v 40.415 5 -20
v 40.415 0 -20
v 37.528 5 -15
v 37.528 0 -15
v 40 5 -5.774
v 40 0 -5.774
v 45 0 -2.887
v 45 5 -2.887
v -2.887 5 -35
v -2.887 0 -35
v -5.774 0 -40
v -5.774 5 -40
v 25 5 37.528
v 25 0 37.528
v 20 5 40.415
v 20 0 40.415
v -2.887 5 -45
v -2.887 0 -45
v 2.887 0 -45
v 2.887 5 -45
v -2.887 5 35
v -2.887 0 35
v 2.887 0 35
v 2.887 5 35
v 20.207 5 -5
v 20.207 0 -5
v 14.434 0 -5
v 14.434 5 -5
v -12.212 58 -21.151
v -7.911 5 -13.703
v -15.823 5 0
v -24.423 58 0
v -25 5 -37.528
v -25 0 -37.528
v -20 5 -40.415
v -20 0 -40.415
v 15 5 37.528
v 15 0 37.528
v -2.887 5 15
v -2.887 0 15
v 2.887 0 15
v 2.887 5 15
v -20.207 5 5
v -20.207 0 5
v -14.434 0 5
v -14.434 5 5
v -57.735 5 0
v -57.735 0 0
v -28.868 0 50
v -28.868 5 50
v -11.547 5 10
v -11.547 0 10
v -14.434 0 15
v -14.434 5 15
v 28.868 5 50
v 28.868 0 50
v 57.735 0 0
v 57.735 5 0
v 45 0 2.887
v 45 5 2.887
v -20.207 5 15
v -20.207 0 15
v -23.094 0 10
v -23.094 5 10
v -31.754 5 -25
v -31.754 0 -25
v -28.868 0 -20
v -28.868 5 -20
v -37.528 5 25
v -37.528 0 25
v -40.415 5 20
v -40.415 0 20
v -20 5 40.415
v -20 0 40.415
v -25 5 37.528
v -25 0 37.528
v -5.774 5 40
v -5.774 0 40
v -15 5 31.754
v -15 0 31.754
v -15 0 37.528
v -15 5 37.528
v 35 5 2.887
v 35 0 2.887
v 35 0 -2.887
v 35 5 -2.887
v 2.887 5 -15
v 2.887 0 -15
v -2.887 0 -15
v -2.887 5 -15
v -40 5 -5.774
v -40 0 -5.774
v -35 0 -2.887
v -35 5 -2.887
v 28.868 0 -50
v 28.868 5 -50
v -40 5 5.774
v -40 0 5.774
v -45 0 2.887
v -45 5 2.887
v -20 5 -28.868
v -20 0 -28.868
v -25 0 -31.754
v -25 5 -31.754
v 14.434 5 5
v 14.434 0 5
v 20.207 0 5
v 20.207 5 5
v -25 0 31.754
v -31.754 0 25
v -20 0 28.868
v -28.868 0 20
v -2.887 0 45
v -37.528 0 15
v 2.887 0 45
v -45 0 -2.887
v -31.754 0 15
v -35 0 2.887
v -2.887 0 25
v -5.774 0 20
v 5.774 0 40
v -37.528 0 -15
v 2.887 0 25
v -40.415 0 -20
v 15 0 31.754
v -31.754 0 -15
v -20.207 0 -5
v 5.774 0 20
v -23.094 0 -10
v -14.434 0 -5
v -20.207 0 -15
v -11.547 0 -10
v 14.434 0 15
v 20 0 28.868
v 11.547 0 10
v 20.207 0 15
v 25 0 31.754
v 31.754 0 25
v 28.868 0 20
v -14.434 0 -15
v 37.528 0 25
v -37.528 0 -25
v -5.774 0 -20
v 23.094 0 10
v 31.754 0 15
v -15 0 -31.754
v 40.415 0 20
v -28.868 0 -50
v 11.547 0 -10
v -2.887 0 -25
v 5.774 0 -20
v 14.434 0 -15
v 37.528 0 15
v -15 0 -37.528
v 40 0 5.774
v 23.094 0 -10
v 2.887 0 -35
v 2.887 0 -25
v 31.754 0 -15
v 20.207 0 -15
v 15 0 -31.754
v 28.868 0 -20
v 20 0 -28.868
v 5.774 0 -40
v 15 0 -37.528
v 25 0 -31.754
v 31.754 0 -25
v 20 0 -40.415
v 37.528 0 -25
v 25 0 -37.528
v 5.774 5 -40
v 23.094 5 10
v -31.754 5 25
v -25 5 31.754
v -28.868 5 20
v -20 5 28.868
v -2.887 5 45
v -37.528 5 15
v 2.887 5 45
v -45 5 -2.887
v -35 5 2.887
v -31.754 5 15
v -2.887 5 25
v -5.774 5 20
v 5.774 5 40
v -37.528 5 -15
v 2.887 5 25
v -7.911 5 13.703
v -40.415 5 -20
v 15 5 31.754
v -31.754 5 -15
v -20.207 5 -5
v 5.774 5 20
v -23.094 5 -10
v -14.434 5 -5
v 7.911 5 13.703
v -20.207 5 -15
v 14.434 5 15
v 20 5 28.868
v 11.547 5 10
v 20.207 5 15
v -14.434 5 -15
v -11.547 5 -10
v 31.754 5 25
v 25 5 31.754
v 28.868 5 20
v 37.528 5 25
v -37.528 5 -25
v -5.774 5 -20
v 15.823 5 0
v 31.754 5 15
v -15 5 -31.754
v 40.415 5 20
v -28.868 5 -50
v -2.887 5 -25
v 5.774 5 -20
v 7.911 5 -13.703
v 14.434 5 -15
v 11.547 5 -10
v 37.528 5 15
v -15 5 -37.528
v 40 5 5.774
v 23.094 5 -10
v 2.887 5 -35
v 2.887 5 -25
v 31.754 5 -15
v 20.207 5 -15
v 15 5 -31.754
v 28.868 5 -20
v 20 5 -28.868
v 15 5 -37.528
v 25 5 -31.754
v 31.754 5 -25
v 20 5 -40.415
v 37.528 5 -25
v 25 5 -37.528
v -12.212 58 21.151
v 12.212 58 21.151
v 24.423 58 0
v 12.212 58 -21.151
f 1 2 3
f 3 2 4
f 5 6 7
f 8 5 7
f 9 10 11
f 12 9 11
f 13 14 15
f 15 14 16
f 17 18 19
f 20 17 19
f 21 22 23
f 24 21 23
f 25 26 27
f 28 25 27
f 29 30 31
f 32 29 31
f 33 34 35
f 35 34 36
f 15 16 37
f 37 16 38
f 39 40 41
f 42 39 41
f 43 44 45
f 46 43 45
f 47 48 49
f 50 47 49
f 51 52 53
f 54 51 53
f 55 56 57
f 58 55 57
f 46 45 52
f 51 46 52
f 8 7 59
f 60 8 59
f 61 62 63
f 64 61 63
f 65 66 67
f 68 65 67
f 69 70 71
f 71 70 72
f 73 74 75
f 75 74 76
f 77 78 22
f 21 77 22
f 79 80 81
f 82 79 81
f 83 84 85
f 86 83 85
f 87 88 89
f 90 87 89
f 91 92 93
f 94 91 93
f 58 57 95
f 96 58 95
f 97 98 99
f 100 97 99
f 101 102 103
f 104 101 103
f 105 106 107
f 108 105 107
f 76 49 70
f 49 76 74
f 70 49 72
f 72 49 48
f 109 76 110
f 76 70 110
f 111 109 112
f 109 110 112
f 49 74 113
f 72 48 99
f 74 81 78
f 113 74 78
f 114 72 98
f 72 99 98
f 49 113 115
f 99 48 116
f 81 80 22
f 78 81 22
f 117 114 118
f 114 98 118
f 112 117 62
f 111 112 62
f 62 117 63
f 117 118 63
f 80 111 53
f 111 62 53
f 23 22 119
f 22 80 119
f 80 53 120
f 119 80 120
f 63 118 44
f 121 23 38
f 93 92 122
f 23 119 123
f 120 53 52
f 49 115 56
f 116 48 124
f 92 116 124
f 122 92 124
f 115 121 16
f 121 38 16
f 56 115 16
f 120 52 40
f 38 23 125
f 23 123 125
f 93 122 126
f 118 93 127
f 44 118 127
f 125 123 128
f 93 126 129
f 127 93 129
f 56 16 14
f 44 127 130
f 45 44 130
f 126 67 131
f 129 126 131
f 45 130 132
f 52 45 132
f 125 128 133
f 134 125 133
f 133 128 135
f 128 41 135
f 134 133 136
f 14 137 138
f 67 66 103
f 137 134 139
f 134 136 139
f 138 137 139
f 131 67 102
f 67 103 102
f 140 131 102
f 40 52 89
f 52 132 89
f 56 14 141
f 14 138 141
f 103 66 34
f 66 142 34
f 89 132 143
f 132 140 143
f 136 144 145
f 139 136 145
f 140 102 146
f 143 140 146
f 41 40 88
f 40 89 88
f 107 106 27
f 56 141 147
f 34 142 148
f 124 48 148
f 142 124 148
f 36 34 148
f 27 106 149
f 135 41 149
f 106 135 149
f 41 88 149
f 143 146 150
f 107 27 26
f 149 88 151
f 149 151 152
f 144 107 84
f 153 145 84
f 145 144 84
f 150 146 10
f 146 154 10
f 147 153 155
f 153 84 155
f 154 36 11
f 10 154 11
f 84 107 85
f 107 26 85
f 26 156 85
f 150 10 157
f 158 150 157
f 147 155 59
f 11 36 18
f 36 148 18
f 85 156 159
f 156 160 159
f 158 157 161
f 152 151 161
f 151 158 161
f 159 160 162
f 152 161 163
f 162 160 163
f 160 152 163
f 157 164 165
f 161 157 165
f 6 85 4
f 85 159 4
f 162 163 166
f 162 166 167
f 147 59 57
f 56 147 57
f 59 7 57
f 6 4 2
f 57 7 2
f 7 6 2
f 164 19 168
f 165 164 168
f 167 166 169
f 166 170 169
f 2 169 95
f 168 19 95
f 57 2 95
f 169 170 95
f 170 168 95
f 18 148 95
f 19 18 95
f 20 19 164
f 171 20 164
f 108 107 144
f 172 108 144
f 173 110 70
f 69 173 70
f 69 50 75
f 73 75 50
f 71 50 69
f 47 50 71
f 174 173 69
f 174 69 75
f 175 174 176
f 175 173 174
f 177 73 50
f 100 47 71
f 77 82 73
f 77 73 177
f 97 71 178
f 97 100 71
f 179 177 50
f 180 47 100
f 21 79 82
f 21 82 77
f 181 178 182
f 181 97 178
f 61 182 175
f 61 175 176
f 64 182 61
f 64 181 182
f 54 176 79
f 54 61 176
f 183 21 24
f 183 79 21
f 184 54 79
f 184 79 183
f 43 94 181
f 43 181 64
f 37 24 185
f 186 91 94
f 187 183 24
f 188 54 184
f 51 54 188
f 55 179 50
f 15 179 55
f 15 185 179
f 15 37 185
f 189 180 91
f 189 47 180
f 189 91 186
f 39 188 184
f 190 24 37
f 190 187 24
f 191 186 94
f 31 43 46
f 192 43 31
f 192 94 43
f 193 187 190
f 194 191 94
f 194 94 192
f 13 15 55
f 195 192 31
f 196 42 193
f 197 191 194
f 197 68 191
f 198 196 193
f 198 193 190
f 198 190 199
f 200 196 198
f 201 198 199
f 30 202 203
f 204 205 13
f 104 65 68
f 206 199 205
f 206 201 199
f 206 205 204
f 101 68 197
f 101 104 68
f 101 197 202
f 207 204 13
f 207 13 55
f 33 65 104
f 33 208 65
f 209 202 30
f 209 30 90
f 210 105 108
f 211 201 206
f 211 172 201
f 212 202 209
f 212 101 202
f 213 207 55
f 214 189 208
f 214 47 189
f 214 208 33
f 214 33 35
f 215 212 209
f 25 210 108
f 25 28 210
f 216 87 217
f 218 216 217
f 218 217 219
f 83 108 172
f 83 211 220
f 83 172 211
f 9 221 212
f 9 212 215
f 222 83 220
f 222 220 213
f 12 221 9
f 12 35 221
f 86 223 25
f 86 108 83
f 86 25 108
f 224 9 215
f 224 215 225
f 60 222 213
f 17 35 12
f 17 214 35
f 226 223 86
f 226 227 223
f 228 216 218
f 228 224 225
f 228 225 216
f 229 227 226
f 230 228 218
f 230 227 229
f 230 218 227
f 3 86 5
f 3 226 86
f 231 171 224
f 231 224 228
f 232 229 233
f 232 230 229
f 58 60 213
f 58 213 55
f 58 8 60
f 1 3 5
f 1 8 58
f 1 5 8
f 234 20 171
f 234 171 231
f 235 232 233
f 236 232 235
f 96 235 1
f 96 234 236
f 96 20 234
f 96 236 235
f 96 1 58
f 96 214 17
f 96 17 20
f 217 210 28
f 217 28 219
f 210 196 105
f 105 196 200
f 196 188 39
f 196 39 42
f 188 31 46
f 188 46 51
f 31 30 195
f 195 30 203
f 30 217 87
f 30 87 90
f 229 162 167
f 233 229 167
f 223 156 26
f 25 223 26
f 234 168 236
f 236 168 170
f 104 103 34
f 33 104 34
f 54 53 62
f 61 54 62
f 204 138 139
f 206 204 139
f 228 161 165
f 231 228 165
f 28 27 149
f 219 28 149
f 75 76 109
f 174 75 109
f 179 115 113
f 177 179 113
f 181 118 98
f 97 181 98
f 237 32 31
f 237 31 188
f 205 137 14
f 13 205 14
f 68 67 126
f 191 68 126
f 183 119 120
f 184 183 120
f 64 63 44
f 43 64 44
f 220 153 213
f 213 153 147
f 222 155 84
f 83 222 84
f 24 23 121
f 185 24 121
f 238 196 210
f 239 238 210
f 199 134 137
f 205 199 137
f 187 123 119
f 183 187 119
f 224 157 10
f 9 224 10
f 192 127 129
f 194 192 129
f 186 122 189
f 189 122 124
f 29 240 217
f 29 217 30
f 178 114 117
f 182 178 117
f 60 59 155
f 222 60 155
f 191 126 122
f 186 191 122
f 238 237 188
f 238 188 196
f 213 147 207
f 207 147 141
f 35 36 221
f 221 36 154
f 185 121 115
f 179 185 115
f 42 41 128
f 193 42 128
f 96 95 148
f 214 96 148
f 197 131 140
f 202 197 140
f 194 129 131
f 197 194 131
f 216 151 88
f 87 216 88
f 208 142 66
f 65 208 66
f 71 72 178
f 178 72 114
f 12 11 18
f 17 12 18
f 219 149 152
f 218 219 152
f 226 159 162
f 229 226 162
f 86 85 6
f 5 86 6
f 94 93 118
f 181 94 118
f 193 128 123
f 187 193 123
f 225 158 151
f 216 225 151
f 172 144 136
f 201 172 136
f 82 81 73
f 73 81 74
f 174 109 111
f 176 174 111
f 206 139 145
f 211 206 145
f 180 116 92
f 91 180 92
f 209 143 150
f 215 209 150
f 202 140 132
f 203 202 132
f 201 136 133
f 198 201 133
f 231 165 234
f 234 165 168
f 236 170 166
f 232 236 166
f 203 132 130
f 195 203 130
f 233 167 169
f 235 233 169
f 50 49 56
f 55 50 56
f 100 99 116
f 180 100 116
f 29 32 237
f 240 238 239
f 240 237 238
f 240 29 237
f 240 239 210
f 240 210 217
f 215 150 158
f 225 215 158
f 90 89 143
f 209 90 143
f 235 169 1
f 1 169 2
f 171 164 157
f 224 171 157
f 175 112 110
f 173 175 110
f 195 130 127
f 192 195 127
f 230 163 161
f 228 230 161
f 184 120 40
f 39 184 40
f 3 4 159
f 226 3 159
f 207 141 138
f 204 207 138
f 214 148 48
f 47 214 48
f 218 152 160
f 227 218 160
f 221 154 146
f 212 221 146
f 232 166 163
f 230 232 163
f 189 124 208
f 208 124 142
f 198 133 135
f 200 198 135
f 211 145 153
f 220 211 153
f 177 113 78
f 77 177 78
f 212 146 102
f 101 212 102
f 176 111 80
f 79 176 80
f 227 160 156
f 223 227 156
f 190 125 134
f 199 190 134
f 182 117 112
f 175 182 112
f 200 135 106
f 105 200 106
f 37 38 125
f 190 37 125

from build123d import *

# Parameters (mm, degrees)
BOSS_EXTRUDE1_DEPTH = 5
BOSS_EXTRUDE2_DEPTH = 58
BOSS_EXTRUDE2_DRAFT = -8


with BuildPart() as part:
    # Sketch1 → Boss-Extrude1 (new body)
    with BuildSketch(Plane(origin=(0, 0, 0), x_dir=(1, 0, 0), z_dir=(0, 1, 0))):
        Polygon((38.97114317, 32.5), (28.867513459, 50), (8.660254038, 50), (-8.660254038, 50), (-28.867513459, 50), (-38.97114317, 32.5), (-47.631397208, 17.5), (-57.735026919, 0), (-47.631397208, -17.5), (-38.97114317, -32.5), (-28.867513459, -50), (-8.660254038, -50), (8.660254038, -50), (28.867513459, -50), (38.97114317, -32.5), (47.631397208, -17.5), (57.735026919, 0), (47.631397208, 17.5), align=None)
        Polygon((-20, -40.414518843), (-25, -37.527767497), (-25, -31.754264805), (-20, -28.867513459), (-15, -31.754264805), (-15, -37.527767497), align=None, mode=Mode.SUBTRACT)
        Polygon((2.886751346, -45), (-2.886751346, -45), (-5.773502692, -40), (-2.886751346, -35), (2.886751346, -35), (5.773502692, -40), align=None, mode=Mode.SUBTRACT)
        Polygon((-37.527767497, -25), (-40.414518843, -20), (-37.527767497, -15), (-31.754264805, -15), (-28.867513459, -20), (-31.754264805, -25), align=None, mode=Mode.SUBTRACT)
        Polygon((-2.886751346, -25), (-5.773502692, -20), (-2.886751346, -15), (2.886751346, -15), (5.773502692, -20), (2.886751346, -25), align=None, mode=Mode.SUBTRACT)
        Polygon((-23.094010768, -10), (-20.207259422, -5), (-14.43375673, -5), (-11.547005384, -10), (-14.43375673, -15), (-20.207259422, -15), align=None, mode=Mode.SUBTRACT)
        Polygon((25, -37.527767497), (20, -40.414518843), (15, -37.527767497), (15, -31.754264805), (20, -28.867513459), (25, -31.754264805), align=None, mode=Mode.SUBTRACT)
        Polygon((40.414518843, -20), (37.527767497, -25), (31.754264805, -25), (28.867513459, -20), (31.754264805, -15), (37.527767497, -15), align=None, mode=Mode.SUBTRACT)
        Polygon((20.207259422, -15), (14.43375673, -15), (11.547005384, -10), (14.43375673, -5), (20.207259422, -5), (23.094010768, -10), align=None, mode=Mode.SUBTRACT)
        Polygon((45, 2.886751346), (45, -2.886751346), (40, -5.773502692), (35, -2.886751346), (35, 2.886751346), (40, 5.773502692), align=None, mode=Mode.SUBTRACT)
        Polygon((-45, -2.886751346), (-45, 2.886751346), (-40, 5.773502692), (-35, 2.886751346), (-35, -2.886751346), (-40, -5.773502692), align=None, mode=Mode.SUBTRACT)
        Polygon((-20.207259422, 15), (-14.43375673, 15), (-11.547005384, 10), (-14.43375673, 5), (-20.207259422, 5), (-23.094010768, 10), align=None, mode=Mode.SUBTRACT)
        Polygon((-40.414518843, 20), (-37.527767497, 25), (-31.754264805, 25), (-28.867513459, 20), (-31.754264805, 15), (-37.527767497, 15), align=None, mode=Mode.SUBTRACT)
        Polygon((-25, 37.527767497), (-20, 40.414518843), (-15, 37.527767497), (-15, 31.754264805), (-20, 28.867513459), (-25, 31.754264805), align=None, mode=Mode.SUBTRACT)
        Polygon((23.094010768, 10), (20.207259422, 5), (14.43375673, 5), (11.547005384, 10), (14.43375673, 15), (20.207259422, 15), align=None, mode=Mode.SUBTRACT)
        Polygon((37.527767497, 25), (40.414518843, 20), (37.527767497, 15), (31.754264805, 15), (28.867513459, 20), (31.754264805, 25), align=None, mode=Mode.SUBTRACT)
        Polygon((2.886751346, 25), (5.773502692, 20), (2.886751346, 15), (-2.886751346, 15), (-5.773502692, 20), (-2.886751346, 25), align=None, mode=Mode.SUBTRACT)
        Polygon((20, 40.414518843), (25, 37.527767497), (25, 31.754264805), (20, 28.867513459), (15, 31.754264805), (15, 37.527767497), align=None, mode=Mode.SUBTRACT)
        Polygon((-2.886751346, 45), (2.886751346, 45), (5.773502692, 40), (2.886751346, 35), (-2.886751346, 35), (-5.773502692, 40), align=None, mode=Mode.SUBTRACT)
    extrude(amount=BOSS_EXTRUDE1_DEPTH)


with BuildPart() as boss_extrude2_tool:
    # Sketch2 → Boss-Extrude2 (with draft: the straight prism first)
    with BuildSketch(Plane(origin=(0, 0, 0), x_dir=(1, 0, 0), z_dir=(0, 1, 0))):
        Polygon((7.505553499, -13), (15.011106999, 0), (7.505553499, 13), (-7.505553499, 13), (-15.011106999, 0), (-7.505553499, -13), align=None)
    extrude(amount=BOSS_EXTRUDE2_DEPTH)
    # Boss-Extrude2: the draft: its side faces are tilted about the plane it starts from
    boss_extrude2_sides = [boss_extrude2_tool.faces().sort_by_distance(p)[0] for p in [
        (11.258330249, 29, 6.5),
        (11.258330249, 29, -6.5),
        (0, 29, -13),
        (-11.258330249, 29, -6.5),
        (-11.258330249, 29, 6.5),
        (0, 29, 13),
    ]]
    draft(boss_extrude2_sides, Plane(origin=(0, 0, 0), x_dir=(1, 0, 0), z_dir=(0, 1, 0)), BOSS_EXTRUDE2_DRAFT)


with BuildPart() as part_1:
    add(part.part)

    # Boss-Extrude2: add boss_extrude2_tool
    add(boss_extrude2_tool.part)


solid = part_1.part
